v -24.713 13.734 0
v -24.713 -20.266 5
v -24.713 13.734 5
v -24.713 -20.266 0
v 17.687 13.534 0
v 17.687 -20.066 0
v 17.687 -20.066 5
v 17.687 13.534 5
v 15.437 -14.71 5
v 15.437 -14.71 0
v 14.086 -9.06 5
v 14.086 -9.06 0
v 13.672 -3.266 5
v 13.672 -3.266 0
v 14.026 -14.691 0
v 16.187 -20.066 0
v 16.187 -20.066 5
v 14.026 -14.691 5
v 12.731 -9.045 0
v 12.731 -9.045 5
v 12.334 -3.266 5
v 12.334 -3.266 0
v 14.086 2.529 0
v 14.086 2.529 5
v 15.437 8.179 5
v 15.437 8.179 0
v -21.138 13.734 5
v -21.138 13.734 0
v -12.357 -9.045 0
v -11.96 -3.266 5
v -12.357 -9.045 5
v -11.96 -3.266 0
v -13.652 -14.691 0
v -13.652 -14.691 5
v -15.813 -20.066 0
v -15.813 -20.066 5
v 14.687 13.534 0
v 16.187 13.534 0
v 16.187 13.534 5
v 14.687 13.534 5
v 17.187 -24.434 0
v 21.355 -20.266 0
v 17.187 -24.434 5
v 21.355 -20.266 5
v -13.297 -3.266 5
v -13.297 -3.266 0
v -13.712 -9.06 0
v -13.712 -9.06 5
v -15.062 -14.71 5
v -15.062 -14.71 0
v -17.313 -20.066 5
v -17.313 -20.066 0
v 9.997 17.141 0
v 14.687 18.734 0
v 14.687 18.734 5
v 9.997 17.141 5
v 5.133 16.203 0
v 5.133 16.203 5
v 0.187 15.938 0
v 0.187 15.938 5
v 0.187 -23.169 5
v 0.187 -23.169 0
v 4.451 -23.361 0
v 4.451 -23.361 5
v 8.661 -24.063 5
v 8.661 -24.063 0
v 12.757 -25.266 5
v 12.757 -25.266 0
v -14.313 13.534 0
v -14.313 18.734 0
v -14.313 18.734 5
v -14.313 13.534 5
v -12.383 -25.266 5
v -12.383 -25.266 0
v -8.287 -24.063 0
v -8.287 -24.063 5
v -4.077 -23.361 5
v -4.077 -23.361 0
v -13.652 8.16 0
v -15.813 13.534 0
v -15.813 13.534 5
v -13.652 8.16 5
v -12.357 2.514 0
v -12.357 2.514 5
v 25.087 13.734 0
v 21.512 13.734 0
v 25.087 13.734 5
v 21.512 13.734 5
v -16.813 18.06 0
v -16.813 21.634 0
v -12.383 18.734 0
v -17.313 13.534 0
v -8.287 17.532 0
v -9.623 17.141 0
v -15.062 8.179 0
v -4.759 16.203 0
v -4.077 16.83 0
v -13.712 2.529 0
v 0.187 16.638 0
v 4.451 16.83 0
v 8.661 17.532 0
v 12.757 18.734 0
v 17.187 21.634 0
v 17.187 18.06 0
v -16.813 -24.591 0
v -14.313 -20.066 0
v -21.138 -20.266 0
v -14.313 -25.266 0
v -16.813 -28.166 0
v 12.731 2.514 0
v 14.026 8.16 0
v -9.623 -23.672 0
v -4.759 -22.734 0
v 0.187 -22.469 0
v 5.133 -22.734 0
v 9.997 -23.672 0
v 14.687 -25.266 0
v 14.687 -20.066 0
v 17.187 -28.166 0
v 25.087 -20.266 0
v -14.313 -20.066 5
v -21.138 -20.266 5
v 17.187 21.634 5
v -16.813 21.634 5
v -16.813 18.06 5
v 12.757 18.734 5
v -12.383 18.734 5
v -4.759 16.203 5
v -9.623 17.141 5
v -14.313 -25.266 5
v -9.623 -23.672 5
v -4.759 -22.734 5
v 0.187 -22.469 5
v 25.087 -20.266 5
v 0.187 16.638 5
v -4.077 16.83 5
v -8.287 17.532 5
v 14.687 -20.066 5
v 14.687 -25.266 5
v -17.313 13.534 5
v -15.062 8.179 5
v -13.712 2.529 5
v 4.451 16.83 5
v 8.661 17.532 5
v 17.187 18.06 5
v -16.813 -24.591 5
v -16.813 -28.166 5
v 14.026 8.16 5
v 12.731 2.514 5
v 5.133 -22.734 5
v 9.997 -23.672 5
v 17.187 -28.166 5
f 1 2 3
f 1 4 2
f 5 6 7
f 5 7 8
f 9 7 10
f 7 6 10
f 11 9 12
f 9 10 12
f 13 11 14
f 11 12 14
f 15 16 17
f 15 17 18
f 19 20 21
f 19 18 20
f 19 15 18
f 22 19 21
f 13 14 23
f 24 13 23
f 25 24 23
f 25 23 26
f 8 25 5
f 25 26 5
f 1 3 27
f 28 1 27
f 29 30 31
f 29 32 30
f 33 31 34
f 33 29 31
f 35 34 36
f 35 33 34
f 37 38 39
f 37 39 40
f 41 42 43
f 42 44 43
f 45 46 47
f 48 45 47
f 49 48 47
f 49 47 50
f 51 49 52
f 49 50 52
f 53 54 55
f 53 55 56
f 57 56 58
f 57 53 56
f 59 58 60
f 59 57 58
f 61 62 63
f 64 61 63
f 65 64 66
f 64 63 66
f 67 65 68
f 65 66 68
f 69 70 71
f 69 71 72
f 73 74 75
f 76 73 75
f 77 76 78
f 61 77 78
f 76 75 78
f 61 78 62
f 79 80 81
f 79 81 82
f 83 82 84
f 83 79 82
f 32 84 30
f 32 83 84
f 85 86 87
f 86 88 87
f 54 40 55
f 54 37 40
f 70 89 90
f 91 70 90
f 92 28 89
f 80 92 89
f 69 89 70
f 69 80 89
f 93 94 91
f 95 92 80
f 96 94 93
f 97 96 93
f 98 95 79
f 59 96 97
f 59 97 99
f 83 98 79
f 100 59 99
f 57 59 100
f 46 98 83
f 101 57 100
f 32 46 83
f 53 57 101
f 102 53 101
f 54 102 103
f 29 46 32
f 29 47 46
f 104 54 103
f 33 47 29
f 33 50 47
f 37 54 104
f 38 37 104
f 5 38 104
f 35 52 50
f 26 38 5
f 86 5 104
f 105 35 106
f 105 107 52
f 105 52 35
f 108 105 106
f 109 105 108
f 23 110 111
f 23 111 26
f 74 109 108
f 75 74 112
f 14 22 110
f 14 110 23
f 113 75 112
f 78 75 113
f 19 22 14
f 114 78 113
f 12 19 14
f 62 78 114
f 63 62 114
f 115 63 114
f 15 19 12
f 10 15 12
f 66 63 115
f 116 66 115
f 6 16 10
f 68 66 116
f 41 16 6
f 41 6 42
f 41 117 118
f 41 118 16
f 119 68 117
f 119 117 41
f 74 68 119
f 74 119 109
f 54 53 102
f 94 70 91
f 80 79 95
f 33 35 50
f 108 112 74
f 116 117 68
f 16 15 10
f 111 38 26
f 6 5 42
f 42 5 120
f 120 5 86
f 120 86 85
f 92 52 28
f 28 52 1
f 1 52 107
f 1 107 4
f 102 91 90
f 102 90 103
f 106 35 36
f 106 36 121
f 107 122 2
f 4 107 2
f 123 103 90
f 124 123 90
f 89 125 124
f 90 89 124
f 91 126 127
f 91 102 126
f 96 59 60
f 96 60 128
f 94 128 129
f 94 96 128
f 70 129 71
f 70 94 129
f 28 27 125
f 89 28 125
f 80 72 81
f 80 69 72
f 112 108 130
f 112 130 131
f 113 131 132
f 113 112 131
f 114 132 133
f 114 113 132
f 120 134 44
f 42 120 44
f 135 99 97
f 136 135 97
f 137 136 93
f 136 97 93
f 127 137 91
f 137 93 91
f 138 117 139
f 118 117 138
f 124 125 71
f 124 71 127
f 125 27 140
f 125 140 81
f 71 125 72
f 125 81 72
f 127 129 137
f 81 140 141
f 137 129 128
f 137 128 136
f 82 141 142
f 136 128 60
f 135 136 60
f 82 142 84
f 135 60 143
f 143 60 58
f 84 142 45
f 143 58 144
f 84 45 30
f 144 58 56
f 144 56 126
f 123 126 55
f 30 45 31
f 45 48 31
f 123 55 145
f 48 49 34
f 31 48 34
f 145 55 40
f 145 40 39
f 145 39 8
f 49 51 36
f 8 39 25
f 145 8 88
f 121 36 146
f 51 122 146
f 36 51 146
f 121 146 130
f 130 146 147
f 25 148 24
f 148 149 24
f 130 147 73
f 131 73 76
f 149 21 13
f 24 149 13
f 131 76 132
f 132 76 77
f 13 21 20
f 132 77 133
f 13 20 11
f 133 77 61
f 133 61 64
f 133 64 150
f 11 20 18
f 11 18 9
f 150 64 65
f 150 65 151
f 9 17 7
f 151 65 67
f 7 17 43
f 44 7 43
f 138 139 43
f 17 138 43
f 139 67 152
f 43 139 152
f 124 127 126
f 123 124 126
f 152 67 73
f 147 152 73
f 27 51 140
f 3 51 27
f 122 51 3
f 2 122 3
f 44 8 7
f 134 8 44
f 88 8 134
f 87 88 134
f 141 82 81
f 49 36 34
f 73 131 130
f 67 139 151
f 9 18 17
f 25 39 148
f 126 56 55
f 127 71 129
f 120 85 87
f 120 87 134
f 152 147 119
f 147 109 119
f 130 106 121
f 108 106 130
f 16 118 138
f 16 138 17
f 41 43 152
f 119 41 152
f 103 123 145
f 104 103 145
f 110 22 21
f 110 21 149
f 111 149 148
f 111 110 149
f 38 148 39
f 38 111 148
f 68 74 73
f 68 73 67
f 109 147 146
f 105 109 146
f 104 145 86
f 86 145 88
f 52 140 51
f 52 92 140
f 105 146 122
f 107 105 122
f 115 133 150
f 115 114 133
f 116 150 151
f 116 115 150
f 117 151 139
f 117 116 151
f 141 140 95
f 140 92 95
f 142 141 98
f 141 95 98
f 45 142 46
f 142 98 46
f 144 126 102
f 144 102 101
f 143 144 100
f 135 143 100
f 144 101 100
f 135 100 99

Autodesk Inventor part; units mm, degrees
ref_plane "YZ Plane" through (0, 0, 0) normal (1, 0, 0) x (0, 1, 0)
ref_plane "XZ Plane" through (0, 0, 0) normal (0, 1, 0) x (-1, 0, 0)
ref_plane "XY Plane" through (0, 0, 0) normal (0, 0, 1) x (1, 0, 0)
sketch "Sketch1" plane through (0, 0, 0) normal (0, 0, 1) x (1, 0, 0)
  line L0 (21.5871, 13.6345) -> (17.0871, 18.1345) projected
  line L1 (17.0871, 18.1345) -> (-16.7129, 18.1345) projected
  line L2 (-16.7129, 18.1345) -> (-21.2129, 13.6345) projected
  line L3 (-21.0966, 13.6345) -> (-21.0966, -20.1655) projected
  line L4 (21.4709, -20.1655) -> (21.4709, 13.6345) projected
  line L5 (21.4709, -20.1655) -> (17.0871, -24.4078) projected
  line L6 (-16.7129, -24.4078) -> (17.0871, -24.4078) projected
  line L7 (-16.7129, -24.4078) -> (-21.0966, -20.1655) projected
  line L8 (-24.7129, -28.1655) -> (-24.7129, 13.6345) construction
  line L9 (25.0871, -28.1655) -> (-24.7129, -28.1655) construction
  line L10 (25.0871, -28.1655) -> (25.0871, 13.6345) construction
  line L11 (17.0871, 21.6345) -> (-16.7129, 21.6345) construction
  line L12 (-21.0552, -20.0655) -> (-16.6129, -24.5078)
  line L13 (-16.6129, -24.5078) -> (-16.6129, -28.1655)
  line L14 (-16.6129, -28.1655) -> (17.0871, -28.1655)
  line L15 (25.0871, -20.0655) -> (21.4295, -20.0655)
  line L16 (25.0871, 13.5345) -> (25.0871, -20.0655)
  line L17 (21.4295, 13.5345) -> (25.0871, 13.5345)
  line L18 (21.4295, 13.5345) -> (16.9871, 17.9768)
  line L19 (16.9871, 17.9768) -> (16.9871, 21.6345)
  line L20 (16.9871, 21.6345) -> (-16.6129, 21.6345)
  line L21 (-16.6129, 21.6345) -> (-16.6129, 17.9768)
  line L22 (-16.6129, 17.9768) -> (-21.0552, 13.5345)
  line L23 (-24.7129, 13.5345) -> (-21.0552, 13.5345)
  line L24 (-24.7129, -20.0655) -> (-24.7129, 13.5345)
  line L25 (-21.0552, -20.0655) -> (-24.7129, -20.0655)
  line L26 (-12.3129, -23.2655) -> (12.6871, -23.2655) projected
  line L27 (12.6871, -23.2655) -> (12.6871, 16.7345) projected
  line L28 (-12.3129, 16.7345) -> (12.6871, 16.7345) projected
  line L29 (-12.3129, -23.2655) -> (-12.3129, 16.7345) projected
  line L30 (14.6871, -25.2655) -> (-14.3129, -25.2655) construction
  line L31 (-14.3129, -25.2655) -> (-14.3129, 18.7345) construction
  line L32 (-14.3129, 18.7345) -> (14.6871, 18.7345) construction
  line L33 (14.6871, 18.7345) -> (14.6871, -25.2655) construction
  line L34 (-17.3129, 21.7345) -> (17.6871, 21.7345) construction
  line L35 (17.6871, 21.7345) -> (17.6871, -28.2655) construction
  line L36 (17.6871, -28.2655) -> (-17.3129, -28.2655) construction
  line L37 (-17.3129, -28.2655) -> (-17.3129, 21.7345) construction
  line L38 (-14.3129, -23.2655) -> (-14.3129, -25.2655)
  line L39 (-14.3129, -25.2655) -> (14.6871, -25.2655)
  line L40 (14.6871, -25.2655) -> (14.6871, -20.0655)
  line L41 (14.6871, -20.0655) -> (17.6871, -20.0655)
  line L42 (17.6871, -20.0655) -> (17.6871, 13.5345)
  line L43 (17.6871, 13.5345) -> (14.6871, 13.5345)
  line L44 (14.6871, 13.5345) -> (14.6871, 18.7345)
  line L45 (14.6871, 18.7345) -> (-14.3129, 18.7345)
  line L46 (-14.3129, 18.7345) -> (-14.3129, 13.5345)
  line L47 (-14.3129, 13.5345) -> (-17.3129, 13.5345)
  line L48 (-17.3129, 13.5345) -> (-17.3129, -20.0655)
  line L49 (-17.3129, -20.0655) -> (-14.3129, -20.0655)
  line L50 (-14.3129, -20.0655) -> (-14.3129, -23.2655)
  line L51 (-16.6129, -28.1655) -> (17.0871, -28.1655)
  line L52 (16.9871, -28.1655) -> (16.9871, -24.3509)
  line L53 (16.9871, -24.3509) -> (21.2726, -20.0655)
  line L54 (21.2726, -20.0655) -> (21.4295, -20.0655)
  point P0 (14.2, -44.8454)
  point P1 (16.9871, 19.8057)
  dimension "d74" = 2
  dimension "d75" = 5
  dimension "d76" = 135
extrude "Extrusion1" add sketch "Sketch1" along normal blind 5 contours L19 L18 L17 L4 L15 L54 L53 L52 L6 L40 L41 L42 L43 L44 L1 | L1 L44 L45 L46 L21 L20 L19 | L46 L47 L48 L49 L50 L38 L6 L12 L25 L3 L23 L22 L21 L1 | L17 L16 L15 L4 | L3 L25 L24 L23 | L6 L52 L14 L13 L12 L38 L39 L40
sketch "Sketch5" plane through (0, 0, 0) normal (0, 0, -1) x (-1, 0, 0)
  line L0 (12.3129, -23.2655) -> (-12.6871, -23.2655) construction
  line L1 (-12.6871, -23.2655) -> (-12.6871, 16.7345) construction
  line L2 (12.3129, 16.7345) -> (-12.6871, 16.7345) construction
  line L3 (12.3129, -23.2655) -> (12.3129, 16.7345) construction
  line L4 (-14.6871, -25.2655) -> (14.3129, -25.2655) construction
  arc A0 (14.3129, -25.2655) -> (-0.1871, -22.4693) centre (0.3594, -58.629) ccw
  arc A1 (12.3827, -25.2655) -> (-0.1871, -23.1694) centre (0.3594, -58.629) ccw
  line L5 (-0.1871, -22.4693) -> (-0.1871, -23.1694)
  line L6 (14.3129, -20.0655) -> (14.3129, -25.2655) projected
  line L7 (14.3129, -25.2655) -> (12.3827, -25.2655)
  point P0 (0, 0)
  dimension "d79" = 0.7
extrude "Extrusion4" add sketch "Sketch5" against normal up to surface (5 mm away)
mirror "Mirror1" about plane through (0.1871, -23.1694, 0) normal (1, 0, 0) of "Extrusion4"
ref_plane "Work Plane1" through (0.1871, -20.0655, 0) normal (-1, 0, 0) x (0, 0, 1)
ref_plane "Work Plane2" through (-16.6129, -3.2655, 0) normal (0, -1, 0) x (1, 0, 0)
mirror "Mirror2" about plane through (-16.6129, -3.2655, 0) normal (0, -1, 0) of "Extrusion4", "Mirror1"
sketch "Sketch6" plane through (0, 0, 0) normal (0, 0, -1) x (-1, 0, 0)
  spline S0 degree 3 poles (1.425, -3.2655) (1.425, -3.4679) (1.3845, -3.6839) (1.22, -4.081) (1.0959, -4.2623) (0.8097, -4.5486) (0.6284, -4.6726) (0.2312, -4.8371) (0.0153, -4.8776) (-0.3896, -4.8776) (-0.6055, -4.8371) (-1.0027, -4.6726) (-1.1839, -4.5486) (-1.4702, -4.2623) (-1.5943, -4.081) (-1.7588, -3.6839) (-1.7992, -3.4679) (-1.7992, -3.0631) (-1.7588, -2.8471) (-1.5943, -2.45) (-1.4702, -2.2687) (-1.1839, -1.9824) (-1.0027, -1.8584) (-0.6055, -1.6939) (-0.3896, -1.6534) (0.0153, -1.6534) (0.2312, -1.6939) (0.6284, -1.8584) (0.8097, -1.9824) (1.0959, -2.2687) (1.22, -2.45) (1.3845, -2.8471) (1.425, -3.0631) (1.425, -3.2655) knots 0 0 0 0 0.060733 0.060733 0.121465 0.121465 0.182198 0.182198 0.24293 0.24293 0.303663 0.303663 0.364395 0.364395 0.425128 0.425128 0.48586 0.48586 0.546593 0.546593 0.607326 0.607326 0.668058 0.668058 0.728791 0.728791 0.789523 0.789523 0.850256 0.850256 0.910988 0.910988 0.971721 0.971721 0.971721 0.971721 projected
  line L0 (17.3129, 13.5345) -> (17.3129, -20.0655) projected
  arc A0 (13.2973, -3.2655) -> (17.3129, -20.0655) centre (48.9305, -3.6282) ccw
  line L1 (17.3129, -20.0655) -> (14.3129, -20.0655) projected
  arc A1 (11.9598, -3.2655) -> (15.8129, -20.0655) centre (48.9305, -3.6282) ccw
  line L2 (11.9598, -3.2655) -> (13.2973, -3.2655)
  line L3 (15.8129, -20.0655) -> (17.3129, -20.0655)
  point P0 (0, 0)
  point P1 (1.425, -3.2655)
extrude "Extrusion5" add sketch "Sketch6" against normal up to surface (5 mm away) contours A0 L1 A1 L2
mirror "Mirror3" about plane through (-11.9598, -3.2655, 0) normal (0, 1, 0) of "Extrusion5"
mirror "Mirror4" about plane through (0.1871, -20.0655, 0) normal (-1, 0, 0) of "Extrusion5", "Mirror3"
sketch "Skizze7" plane through (0, 0, 5) normal (0, 0, 1) x (1, 0, 0)
  arc A0 (12.3341, -3.2655) -> (16.1871, -20.0655) centre (49.3047, -3.6282) ccw construction
  line L0 (16.1871, -20.0655) -> (14.6871, -20.0655) projected
  line L1 (14.6871, -20.0655) -> (14.6871, -25.2655) projected
  arc A1 (14.6871, -25.2655) -> (0.1871, -22.4693) centre (0.7336, -58.629) ccw construction
  arc A2 (0.1871, -22.4693) -> (-14.3129, -25.2655) centre (-0.3594, -58.629) ccw construction
  line L2 (-14.3129, -25.2655) -> (-14.3129, -20.0655) construction
  line L3 (-14.3129, -20.0655) -> (-15.8129, -20.0655) construction
  arc A3 (-15.8129, -20.0655) -> (-11.9598, -3.2655) centre (-48.9305, -3.6282) ccw construction
  arc A4 (-11.9598, -3.2655) -> (-15.8129, 13.5345) centre (-48.9305, -2.9028) ccw construction
  line L4 (-15.8129, 13.5345) -> (-14.3129, 13.5345) construction
  line L5 (-14.3129, 13.5345) -> (-14.3129, 18.7345) construction
  arc A5 (-14.3129, 18.7345) -> (0.1871, 15.9383) centre (-0.3594, 52.098) ccw construction
  arc A6 (0.1871, 15.9383) -> (14.6871, 18.7345) centre (0.7336, 52.098) ccw construction
  line L6 (14.6871, 18.7345) -> (14.6871, 13.5345) construction
  line L7 (14.6871, 13.5345) -> (16.1871, 13.5345) construction
  arc A7 (16.1871, 13.5345) -> (12.3341, -3.2655) centre (49.3047, -2.9028) ccw construction
  arc A8 (-17.3129, -20.0655) -> (-13.2973, -3.2655) centre (-48.9305, -3.6282) ccw construction
  line L8 (-17.3129, -20.0655) -> (-17.3129, 13.5345) construction
  arc A9 (-13.2973, -3.2655) -> (-17.3129, 13.5345) centre (-48.9305, -2.9028) ccw construction
  arc A10 (17.6871, 13.5345) -> (13.6715, -3.2655) centre (49.3047, -2.9028) ccw construction
  line L9 (17.6871, 13.5345) -> (17.6871, -20.0655) construction
  arc A11 (13.6715, -3.2655) -> (17.6871, -20.0655) centre (49.3047, -3.6282) ccw construction
  line L10 (12.757, -25.2655) -> (-12.3827, -25.2655) construction
  arc A12 (0.1871, -23.1694) -> (-12.3827, -25.2655) centre (-0.3594, -58.629) ccw construction
  arc A13 (12.757, -25.2655) -> (0.1871, -23.1694) centre (0.7336, -58.629) ccw construction
  arc A14 (0.1871, 16.6384) -> (12.757, 18.7345) centre (0.7336, 52.098) ccw construction
  arc A15 (-12.3827, 18.7345) -> (0.1871, 16.6384) centre (-0.3594, 52.098) ccw construction
  line L11 (-12.3827, 18.7345) -> (12.757, 18.7345) construction
  line L12 (-21.0552, -20.0655) -> (-16.6129, -24.5078) projected
  line L13 (-16.6129, -24.5078) -> (-16.6129, -28.1655) projected
  line L14 (-16.6129, -28.1655) -> (16.9871, -28.1655) construction
  line L15 (16.9871, -28.1655) -> (16.9871, -24.3509) projected
  line L16 (16.9871, -24.3509) -> (21.2726, -20.0655) projected
  line L17 (21.2726, -20.0655) -> (25.0871, -20.0655) projected
  line L18 (25.0871, -20.0655) -> (25.0871, 13.5345) construction
  line L19 (25.0871, 13.5345) -> (21.4295, 13.5345) projected
  line L20 (21.4295, 13.5345) -> (16.9871, 17.9768) projected
  line L21 (16.9871, 17.9768) -> (16.9871, 21.6345) projected
  line L22 (16.9871, 21.6345) -> (-16.6129, 21.6345) construction
  line L23 (-16.6129, 21.6345) -> (-16.6129, 17.9768) projected
  line L24 (-16.6129, 17.9768) -> (-21.0552, 13.5345) projected
  line L25 (-21.0552, 13.5345) -> (-24.7129, 13.5345) projected
  line L26 (-24.7129, 13.5345) -> (-24.7129, -20.0655) construction
  line L27 (-24.7129, -20.0655) -> (-21.0552, -20.0655) projected
  line L28 (-16.8129, 21.8345) -> (17.1871, 21.8345) construction
  line L29 (17.1871, 21.8345) -> (17.1871, 18.0597)
  line L30 (17.1871, 18.0597) -> (21.5123, 13.7345)
  line L31 (21.5123, 13.7345) -> (25.2871, 13.7345)
  line L32 (25.2871, 13.7345) -> (25.2871, -20.2655) construction
  line L33 (25.2871, -20.2655) -> (21.3554, -20.2655)
  line L34 (21.3554, -20.2655) -> (17.1871, -24.4338)
  line L35 (17.1871, -24.4338) -> (17.1871, -28.3655)
  line L36 (17.1871, -28.3655) -> (-16.8129, -28.3655) construction
  line L37 (-16.8129, -28.3655) -> (-16.8129, -24.5907)
  line L38 (-16.8129, -24.5907) -> (-21.1381, -20.2655)
  line L39 (-21.1381, -20.2655) -> (-24.9129, -20.2655)
  line L40 (-24.9129, -20.2655) -> (-24.9129, 13.7345) construction
  line L41 (-24.9129, 13.7345) -> (-21.1381, 13.7345)
  line L42 (-21.1381, 13.7345) -> (-16.8129, 18.0597)
  line L43 (-16.8129, 18.0597) -> (-16.8129, 21.8345)
  line L44 (-21.0552, 13.5345) -> (-24.7129, 13.5345) projected
  line L45 (-24.7129, 13.5345) -> (-24.7129, 13.7345)
  line L46 (-16.6129, 21.6345) -> (-16.8129, 21.6345)
  line L47 (16.9871, 17.9768) -> (16.9871, 21.6345) projected
  line L48 (16.9871, 21.6345) -> (17.1871, 21.6345)
  line L49 (25.0871, -20.0655) -> (25.0871, 13.5345) projected
  line L50 (25.0871, 13.5345) -> (25.0871, 13.7345)
  line L51 (25.0871, -20.0655) -> (25.0871, -20.2655)
  line L52 (-16.6129, -28.1655) -> (16.9871, -28.1655) projected
  line L53 (16.9871, -28.1655) -> (17.1871, -28.1655)
  line L54 (-16.6129, -28.1655) -> (-16.8129, -28.1655)
  line L55 (-24.7129, -20.0655) -> (-24.7129, -20.2655)
  point P0 (0, 0)
  dimension "d83" = 0.2
extrude "IM_offset" add sketch "Skizze7" against normal up to surface (5 mm away)
properties part number "20_Cube_Insert_Lens_Cylindrical_v3"
